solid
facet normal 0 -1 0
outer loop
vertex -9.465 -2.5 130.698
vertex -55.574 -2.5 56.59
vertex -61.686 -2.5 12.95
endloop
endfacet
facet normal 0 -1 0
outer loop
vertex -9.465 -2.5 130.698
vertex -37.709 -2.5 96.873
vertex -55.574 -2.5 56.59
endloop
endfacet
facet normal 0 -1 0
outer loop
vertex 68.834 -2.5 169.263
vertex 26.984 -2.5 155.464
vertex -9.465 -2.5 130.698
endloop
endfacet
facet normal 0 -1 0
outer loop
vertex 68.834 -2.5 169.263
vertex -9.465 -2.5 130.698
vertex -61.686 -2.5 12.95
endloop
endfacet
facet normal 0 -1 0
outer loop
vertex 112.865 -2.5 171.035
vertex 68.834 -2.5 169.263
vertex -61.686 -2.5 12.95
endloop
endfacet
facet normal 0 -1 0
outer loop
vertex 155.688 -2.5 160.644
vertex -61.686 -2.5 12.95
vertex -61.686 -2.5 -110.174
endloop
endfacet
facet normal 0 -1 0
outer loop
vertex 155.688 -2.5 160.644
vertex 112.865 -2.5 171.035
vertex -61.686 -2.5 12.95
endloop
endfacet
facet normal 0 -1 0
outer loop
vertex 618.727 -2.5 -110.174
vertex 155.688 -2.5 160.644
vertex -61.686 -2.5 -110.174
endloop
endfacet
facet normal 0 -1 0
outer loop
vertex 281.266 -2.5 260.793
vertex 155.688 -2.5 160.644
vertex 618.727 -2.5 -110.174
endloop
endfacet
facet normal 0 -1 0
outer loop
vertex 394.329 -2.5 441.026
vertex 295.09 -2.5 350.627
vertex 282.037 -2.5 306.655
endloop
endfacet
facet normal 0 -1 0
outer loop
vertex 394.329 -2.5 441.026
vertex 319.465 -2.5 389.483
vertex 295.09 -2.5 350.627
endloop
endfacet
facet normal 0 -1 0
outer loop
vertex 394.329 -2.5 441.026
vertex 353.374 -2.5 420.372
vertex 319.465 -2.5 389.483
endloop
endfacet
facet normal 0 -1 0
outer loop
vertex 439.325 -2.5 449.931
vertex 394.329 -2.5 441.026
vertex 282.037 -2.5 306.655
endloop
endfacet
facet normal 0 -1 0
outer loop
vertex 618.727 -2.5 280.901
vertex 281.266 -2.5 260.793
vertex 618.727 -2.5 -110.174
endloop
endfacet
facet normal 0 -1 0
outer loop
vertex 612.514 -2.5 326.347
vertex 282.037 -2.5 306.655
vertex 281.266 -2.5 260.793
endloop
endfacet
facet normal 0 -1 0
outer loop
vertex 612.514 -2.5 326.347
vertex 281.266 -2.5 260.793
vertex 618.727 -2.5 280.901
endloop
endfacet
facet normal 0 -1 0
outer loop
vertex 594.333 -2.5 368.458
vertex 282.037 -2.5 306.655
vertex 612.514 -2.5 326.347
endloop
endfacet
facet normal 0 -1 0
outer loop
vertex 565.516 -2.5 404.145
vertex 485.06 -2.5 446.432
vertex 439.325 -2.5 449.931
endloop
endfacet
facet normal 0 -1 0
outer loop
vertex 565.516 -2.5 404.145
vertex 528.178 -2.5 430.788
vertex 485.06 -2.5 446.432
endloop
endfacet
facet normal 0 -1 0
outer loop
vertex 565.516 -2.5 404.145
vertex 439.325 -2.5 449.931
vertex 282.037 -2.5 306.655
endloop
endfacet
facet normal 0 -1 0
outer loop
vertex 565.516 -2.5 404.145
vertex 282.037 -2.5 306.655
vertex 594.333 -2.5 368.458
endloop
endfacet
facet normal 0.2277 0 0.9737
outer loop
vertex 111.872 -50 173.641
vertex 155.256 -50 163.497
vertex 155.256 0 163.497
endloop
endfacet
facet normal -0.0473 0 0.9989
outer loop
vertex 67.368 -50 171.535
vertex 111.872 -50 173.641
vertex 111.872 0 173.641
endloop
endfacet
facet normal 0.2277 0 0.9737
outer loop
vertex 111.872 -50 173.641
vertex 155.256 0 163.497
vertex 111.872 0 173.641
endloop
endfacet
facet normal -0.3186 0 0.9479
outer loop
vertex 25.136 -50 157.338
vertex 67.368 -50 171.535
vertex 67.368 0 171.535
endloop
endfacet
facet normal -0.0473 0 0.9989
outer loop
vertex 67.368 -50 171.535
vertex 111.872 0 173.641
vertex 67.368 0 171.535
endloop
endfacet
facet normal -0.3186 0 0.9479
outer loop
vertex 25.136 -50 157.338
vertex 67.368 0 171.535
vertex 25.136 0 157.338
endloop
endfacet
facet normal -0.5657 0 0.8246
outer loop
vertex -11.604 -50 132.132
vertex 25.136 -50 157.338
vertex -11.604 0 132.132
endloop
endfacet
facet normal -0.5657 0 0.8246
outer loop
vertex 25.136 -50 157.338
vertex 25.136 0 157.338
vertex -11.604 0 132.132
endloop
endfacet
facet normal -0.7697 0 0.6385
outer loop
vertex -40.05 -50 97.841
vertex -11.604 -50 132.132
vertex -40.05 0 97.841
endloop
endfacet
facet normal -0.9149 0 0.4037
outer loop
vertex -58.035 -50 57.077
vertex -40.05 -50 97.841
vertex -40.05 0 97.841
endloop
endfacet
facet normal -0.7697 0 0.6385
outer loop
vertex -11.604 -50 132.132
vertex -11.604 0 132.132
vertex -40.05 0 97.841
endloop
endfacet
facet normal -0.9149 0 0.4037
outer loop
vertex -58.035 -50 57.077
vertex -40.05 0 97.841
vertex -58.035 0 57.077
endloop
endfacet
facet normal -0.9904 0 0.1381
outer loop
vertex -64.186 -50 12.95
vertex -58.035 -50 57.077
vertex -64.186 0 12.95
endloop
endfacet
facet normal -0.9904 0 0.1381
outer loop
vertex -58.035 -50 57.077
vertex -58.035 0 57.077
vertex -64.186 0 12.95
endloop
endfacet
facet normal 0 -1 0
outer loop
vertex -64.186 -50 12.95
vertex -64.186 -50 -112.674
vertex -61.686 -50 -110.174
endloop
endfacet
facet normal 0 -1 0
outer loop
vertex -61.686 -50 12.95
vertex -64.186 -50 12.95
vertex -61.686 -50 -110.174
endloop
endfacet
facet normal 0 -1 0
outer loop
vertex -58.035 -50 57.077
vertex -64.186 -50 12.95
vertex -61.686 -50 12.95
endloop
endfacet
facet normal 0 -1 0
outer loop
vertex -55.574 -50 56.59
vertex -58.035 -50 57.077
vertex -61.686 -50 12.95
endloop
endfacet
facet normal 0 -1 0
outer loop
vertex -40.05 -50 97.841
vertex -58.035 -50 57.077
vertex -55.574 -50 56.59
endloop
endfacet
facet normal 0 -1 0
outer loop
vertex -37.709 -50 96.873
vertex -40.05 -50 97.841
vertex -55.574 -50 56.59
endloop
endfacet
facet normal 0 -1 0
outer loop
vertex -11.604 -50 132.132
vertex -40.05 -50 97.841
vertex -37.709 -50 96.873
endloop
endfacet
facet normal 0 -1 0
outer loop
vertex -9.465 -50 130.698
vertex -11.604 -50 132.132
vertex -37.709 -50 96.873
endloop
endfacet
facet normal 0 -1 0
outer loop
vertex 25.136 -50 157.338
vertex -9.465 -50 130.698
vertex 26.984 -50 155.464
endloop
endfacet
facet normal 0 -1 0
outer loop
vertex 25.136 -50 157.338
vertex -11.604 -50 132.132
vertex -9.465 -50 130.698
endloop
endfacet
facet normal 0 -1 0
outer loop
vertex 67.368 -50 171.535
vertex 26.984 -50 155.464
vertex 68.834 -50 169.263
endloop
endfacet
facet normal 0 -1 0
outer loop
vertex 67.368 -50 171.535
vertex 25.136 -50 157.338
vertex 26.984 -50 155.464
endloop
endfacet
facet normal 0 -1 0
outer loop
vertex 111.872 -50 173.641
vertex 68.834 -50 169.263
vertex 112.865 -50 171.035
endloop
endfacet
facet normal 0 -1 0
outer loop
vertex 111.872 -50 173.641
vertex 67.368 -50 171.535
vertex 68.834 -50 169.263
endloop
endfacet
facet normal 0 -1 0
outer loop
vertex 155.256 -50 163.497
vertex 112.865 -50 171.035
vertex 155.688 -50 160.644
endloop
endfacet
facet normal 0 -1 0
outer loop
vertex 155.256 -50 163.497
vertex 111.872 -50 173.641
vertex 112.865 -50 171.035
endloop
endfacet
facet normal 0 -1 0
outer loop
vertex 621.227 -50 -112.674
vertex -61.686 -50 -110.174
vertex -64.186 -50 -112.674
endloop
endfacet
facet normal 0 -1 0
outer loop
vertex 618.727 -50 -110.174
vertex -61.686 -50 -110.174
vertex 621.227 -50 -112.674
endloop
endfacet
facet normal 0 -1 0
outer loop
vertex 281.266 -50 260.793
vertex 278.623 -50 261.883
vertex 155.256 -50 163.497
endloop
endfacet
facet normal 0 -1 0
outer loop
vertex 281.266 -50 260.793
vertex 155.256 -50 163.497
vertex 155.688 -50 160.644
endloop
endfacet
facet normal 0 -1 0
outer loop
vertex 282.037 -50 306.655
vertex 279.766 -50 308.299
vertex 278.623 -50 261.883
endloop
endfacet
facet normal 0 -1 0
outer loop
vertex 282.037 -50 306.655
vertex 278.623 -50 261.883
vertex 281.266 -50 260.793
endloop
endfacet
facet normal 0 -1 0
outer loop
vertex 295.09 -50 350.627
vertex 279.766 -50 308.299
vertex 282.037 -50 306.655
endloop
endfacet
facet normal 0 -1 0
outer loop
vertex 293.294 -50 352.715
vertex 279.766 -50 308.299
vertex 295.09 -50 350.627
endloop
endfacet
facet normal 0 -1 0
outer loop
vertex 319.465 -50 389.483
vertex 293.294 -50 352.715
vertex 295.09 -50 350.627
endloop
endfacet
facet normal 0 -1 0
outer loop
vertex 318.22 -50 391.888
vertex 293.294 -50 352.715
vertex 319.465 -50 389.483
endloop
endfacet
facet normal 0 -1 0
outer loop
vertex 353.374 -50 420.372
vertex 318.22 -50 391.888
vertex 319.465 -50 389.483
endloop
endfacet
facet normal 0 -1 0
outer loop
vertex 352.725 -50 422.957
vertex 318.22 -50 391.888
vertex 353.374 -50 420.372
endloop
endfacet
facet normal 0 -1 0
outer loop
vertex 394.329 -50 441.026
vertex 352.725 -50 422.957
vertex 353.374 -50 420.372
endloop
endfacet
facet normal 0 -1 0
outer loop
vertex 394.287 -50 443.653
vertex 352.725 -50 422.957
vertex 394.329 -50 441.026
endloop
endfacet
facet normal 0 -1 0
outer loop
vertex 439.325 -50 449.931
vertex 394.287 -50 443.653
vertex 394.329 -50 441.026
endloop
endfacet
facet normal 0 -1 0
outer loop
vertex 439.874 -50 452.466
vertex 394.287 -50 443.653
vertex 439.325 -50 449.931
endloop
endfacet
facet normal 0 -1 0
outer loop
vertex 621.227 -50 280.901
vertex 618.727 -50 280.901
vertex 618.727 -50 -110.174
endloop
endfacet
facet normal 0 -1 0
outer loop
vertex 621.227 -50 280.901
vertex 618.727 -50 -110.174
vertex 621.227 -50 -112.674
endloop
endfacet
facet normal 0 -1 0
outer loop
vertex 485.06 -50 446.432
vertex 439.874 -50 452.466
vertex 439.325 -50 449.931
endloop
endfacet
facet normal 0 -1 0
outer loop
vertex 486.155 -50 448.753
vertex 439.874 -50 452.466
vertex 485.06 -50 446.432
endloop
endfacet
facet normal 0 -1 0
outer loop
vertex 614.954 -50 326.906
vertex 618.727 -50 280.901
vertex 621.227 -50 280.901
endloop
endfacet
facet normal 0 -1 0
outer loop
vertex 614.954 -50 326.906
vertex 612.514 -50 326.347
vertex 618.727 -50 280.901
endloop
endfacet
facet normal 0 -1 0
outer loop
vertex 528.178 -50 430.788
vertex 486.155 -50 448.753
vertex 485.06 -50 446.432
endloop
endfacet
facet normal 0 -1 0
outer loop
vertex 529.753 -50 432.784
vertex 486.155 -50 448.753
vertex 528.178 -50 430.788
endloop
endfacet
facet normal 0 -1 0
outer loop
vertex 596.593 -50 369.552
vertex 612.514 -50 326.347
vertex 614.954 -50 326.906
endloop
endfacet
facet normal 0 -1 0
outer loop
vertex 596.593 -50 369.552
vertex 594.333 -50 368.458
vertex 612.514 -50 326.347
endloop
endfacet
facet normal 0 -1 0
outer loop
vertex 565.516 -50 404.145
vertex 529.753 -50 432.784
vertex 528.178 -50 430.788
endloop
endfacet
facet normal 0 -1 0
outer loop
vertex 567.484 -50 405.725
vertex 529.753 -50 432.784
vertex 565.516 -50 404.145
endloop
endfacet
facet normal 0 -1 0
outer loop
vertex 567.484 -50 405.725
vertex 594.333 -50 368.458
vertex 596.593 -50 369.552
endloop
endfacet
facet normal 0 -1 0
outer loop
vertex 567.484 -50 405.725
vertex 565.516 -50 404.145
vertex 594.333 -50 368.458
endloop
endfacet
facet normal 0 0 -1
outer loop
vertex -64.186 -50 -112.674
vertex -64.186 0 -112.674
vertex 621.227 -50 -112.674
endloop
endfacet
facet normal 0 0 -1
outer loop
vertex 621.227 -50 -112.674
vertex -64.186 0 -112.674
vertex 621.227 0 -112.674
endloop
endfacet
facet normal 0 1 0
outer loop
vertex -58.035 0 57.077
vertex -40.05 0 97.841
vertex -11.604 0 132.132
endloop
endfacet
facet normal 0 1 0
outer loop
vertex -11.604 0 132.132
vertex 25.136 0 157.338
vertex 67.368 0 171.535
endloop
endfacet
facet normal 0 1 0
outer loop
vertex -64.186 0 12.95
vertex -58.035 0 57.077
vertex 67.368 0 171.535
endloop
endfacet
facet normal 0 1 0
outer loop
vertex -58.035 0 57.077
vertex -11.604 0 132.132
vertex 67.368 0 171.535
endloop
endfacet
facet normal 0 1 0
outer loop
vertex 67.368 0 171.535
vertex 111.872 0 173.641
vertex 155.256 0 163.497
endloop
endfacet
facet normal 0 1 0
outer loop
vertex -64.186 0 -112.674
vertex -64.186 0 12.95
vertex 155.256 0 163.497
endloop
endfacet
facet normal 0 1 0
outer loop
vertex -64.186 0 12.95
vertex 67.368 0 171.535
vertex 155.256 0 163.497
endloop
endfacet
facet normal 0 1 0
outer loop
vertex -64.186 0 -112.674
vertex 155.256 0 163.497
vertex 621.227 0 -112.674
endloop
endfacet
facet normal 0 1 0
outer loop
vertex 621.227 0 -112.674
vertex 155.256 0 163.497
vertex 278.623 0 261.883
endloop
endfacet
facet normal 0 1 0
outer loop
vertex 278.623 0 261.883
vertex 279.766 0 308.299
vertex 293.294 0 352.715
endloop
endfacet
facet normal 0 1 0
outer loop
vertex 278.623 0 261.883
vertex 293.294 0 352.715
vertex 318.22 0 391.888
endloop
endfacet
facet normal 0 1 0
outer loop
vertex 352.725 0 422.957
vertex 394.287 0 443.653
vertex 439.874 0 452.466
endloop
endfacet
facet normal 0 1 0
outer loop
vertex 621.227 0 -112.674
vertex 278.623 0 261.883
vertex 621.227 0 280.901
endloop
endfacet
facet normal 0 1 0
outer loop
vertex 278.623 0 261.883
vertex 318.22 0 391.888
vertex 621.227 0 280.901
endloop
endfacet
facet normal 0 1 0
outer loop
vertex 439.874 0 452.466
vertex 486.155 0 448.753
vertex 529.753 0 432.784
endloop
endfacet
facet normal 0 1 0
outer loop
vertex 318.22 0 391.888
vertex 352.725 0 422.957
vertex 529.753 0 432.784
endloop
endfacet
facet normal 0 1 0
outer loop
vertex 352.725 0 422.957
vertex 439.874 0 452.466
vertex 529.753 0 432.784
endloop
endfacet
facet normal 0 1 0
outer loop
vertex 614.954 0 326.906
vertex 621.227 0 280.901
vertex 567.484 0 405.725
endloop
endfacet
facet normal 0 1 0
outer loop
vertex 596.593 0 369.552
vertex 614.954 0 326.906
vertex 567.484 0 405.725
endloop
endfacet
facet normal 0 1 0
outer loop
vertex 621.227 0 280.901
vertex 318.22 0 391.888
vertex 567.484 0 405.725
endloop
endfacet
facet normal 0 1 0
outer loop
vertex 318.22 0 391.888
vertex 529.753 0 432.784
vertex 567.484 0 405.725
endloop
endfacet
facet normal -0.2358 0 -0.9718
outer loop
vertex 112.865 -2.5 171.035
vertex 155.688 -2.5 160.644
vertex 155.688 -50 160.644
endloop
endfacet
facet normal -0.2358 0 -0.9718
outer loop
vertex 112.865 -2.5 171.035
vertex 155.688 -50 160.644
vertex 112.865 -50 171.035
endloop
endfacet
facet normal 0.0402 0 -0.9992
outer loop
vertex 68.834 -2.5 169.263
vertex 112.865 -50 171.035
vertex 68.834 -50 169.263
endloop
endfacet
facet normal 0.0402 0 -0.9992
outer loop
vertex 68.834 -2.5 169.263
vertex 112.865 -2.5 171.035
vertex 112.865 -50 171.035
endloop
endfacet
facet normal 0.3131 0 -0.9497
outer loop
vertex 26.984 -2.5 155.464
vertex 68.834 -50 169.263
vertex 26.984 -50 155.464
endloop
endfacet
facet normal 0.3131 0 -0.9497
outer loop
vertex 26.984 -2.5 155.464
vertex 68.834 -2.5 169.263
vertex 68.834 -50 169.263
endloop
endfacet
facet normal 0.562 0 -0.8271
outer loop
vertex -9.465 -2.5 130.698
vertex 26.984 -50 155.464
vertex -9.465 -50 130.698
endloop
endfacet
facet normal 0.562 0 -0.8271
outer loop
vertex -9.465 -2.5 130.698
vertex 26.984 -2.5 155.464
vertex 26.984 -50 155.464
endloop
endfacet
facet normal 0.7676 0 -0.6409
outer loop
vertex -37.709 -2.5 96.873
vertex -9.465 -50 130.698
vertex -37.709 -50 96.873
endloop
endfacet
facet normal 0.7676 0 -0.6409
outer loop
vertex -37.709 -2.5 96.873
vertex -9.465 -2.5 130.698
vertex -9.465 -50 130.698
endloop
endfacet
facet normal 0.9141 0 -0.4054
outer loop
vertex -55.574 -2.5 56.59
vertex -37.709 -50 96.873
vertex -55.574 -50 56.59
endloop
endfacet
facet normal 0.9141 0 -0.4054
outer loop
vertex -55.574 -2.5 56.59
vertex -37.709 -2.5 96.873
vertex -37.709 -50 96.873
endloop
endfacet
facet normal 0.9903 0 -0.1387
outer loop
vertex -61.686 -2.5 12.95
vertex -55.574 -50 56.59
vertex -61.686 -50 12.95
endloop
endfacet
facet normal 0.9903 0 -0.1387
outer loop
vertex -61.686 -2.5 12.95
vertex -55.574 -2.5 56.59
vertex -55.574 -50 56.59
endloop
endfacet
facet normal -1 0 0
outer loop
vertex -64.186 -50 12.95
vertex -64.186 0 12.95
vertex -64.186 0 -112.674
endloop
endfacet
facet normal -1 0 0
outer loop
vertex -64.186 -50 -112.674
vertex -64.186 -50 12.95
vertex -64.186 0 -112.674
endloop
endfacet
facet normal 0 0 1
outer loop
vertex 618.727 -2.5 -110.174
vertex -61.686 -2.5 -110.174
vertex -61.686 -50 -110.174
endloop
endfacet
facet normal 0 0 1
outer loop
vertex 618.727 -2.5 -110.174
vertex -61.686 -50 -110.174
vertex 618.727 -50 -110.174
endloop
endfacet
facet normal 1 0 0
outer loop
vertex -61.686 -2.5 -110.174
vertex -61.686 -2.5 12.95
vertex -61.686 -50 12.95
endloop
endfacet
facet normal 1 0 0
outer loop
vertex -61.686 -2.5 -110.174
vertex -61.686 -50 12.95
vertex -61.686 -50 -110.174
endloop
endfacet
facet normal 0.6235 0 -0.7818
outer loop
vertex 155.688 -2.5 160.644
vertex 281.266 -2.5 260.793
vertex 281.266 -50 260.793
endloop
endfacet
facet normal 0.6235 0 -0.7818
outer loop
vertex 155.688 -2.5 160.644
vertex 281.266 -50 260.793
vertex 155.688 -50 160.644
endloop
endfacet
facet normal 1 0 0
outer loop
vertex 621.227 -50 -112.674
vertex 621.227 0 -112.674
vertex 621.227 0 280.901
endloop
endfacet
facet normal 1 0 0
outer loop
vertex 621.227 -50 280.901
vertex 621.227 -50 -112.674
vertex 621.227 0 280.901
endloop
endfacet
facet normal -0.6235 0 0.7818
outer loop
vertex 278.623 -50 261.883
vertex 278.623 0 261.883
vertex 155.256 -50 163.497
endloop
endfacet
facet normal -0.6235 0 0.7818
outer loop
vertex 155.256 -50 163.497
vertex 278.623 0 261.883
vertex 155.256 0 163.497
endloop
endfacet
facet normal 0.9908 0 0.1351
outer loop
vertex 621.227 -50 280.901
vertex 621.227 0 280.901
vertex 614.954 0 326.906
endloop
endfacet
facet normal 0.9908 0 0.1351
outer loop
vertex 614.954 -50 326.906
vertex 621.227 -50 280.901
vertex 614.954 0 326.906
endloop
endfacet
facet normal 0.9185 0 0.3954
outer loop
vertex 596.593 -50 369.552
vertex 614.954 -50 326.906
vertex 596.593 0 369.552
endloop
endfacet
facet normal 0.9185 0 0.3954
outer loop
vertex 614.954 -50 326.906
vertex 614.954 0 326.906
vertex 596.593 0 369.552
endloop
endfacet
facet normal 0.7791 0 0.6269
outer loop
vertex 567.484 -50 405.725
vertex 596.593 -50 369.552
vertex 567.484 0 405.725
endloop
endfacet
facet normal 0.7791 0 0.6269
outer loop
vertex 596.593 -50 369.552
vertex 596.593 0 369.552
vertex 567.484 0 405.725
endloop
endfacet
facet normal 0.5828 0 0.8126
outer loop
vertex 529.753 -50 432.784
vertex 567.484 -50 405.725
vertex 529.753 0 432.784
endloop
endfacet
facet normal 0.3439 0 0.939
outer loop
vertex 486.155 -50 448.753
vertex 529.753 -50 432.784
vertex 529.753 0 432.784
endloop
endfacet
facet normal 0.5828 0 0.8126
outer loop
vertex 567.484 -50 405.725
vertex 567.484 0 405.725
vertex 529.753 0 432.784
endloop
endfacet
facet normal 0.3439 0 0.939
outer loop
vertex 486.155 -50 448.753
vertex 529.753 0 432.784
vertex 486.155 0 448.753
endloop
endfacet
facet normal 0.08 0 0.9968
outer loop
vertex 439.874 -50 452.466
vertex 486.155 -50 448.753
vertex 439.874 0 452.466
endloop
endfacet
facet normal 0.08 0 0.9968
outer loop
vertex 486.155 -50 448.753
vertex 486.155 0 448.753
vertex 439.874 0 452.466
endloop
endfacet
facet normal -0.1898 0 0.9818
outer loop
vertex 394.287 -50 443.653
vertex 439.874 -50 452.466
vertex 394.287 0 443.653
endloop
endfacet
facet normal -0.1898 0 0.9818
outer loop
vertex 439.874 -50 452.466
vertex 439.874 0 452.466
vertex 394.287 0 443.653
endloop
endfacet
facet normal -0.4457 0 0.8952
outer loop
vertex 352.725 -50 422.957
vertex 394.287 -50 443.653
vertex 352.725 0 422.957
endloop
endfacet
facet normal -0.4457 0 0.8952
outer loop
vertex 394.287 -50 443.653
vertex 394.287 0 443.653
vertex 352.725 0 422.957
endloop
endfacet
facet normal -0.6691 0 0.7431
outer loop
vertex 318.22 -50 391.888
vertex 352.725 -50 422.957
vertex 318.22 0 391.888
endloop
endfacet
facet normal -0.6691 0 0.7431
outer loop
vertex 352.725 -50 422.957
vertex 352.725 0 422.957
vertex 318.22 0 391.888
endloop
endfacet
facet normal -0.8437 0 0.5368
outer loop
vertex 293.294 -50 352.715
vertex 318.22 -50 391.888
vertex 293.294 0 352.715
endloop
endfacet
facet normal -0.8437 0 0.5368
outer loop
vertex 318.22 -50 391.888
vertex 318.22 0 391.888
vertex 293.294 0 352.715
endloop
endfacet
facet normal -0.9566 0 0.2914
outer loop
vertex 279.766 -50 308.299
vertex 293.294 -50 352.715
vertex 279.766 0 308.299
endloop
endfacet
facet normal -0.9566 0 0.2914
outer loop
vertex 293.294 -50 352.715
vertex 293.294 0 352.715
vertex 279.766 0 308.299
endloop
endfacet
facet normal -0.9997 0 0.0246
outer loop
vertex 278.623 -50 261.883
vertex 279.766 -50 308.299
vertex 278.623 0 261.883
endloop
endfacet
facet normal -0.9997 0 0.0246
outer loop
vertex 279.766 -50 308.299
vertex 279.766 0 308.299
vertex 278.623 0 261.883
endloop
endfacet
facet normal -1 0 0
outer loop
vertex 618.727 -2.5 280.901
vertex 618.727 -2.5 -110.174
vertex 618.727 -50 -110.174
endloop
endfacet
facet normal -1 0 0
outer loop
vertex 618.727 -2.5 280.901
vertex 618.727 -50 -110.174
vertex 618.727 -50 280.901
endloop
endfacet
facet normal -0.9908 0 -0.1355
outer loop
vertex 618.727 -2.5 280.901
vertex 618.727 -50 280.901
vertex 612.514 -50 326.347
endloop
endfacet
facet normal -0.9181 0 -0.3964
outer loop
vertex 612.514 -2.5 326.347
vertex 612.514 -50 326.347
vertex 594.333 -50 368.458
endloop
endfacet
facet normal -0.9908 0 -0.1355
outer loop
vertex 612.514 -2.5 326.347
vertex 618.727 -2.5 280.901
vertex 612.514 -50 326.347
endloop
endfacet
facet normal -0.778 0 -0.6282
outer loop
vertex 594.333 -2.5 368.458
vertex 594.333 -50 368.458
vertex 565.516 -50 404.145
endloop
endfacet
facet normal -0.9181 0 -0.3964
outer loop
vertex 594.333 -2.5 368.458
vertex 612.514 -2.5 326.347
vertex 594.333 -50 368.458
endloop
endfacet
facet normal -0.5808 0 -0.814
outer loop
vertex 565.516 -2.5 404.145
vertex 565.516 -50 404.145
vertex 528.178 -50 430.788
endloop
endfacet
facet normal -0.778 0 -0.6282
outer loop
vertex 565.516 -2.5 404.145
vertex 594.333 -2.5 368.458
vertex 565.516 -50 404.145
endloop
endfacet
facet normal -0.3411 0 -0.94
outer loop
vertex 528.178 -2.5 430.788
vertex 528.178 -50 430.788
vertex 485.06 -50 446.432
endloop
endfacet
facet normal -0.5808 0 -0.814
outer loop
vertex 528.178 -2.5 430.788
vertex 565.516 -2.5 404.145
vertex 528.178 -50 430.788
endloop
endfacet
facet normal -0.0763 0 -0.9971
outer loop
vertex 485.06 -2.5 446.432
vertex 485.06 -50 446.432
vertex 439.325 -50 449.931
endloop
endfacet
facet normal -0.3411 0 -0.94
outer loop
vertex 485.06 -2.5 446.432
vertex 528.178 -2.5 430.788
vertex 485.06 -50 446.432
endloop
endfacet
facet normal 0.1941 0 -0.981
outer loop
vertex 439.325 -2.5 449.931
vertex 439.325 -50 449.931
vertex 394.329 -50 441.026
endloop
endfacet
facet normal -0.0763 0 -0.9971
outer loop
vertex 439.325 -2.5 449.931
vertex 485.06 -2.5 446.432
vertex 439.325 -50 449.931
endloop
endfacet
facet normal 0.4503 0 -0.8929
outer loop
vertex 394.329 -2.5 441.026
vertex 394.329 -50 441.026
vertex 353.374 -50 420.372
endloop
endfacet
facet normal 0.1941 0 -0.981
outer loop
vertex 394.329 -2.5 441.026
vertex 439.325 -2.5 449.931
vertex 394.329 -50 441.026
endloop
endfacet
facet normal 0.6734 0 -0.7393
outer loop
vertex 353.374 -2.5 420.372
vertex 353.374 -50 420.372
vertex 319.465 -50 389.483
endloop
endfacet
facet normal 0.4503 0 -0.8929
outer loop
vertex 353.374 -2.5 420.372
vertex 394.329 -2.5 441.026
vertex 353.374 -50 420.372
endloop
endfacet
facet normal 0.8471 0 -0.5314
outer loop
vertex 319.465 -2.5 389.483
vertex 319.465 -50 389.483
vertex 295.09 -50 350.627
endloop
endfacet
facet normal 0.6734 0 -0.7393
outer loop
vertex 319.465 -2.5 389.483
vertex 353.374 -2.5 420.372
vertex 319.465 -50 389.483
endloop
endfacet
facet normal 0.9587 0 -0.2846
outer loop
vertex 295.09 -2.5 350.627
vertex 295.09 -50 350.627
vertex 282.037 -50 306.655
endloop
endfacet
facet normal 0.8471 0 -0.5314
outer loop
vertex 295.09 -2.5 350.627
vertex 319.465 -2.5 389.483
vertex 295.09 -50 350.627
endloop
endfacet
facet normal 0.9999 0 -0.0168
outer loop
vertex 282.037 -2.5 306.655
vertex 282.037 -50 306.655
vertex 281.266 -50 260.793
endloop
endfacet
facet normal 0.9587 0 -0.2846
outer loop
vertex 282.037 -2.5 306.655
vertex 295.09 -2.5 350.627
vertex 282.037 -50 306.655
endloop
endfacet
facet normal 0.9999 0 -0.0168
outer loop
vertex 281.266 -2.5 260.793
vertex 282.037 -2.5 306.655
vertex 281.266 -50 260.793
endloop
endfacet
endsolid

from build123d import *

# Parameters (mm, degrees)
F1_DEPTH = 50
F2_T     = -2.5


with BuildPart() as f1:
    # F0 (on Front) → F1 (new body)
    with BuildSketch(Plane.XZ):
        with BuildLine():
            ThreePointArc((155.2564352751, 163.4969860315), (5.8915510694, 146.0091765296), (-64.1858130693, 12.949584052))
            Line((-64.1858130693, 12.949584052), (-64.1858130693, -112.6743033528))
            Line((-64.1858130693, -112.6743033528), (621.2269067764, -112.6743033528))
            Line((621.2269067764, -112.6743033528), (621.2269067764, 280.9008359909))
            ThreePointArc((621.2269067764, 280.9008359909), (439.8735747108, 452.4664689198), (278.6230742931, 261.8829607964))
            Line((278.6230742931, 261.8829607964), (155.2564352751, 163.4969860315))
        make_face()
    extrude(amount=F1_DEPTH)

    # F2
    f2_openings = [f1.faces().sort_by_distance(p)[0] for p in [
        (335.096712, -50, 111.093297),
    ]]
    offset(amount=F2_T, openings=f2_openings, kind=Kind.INTERSECTION)


solid = f1.part
